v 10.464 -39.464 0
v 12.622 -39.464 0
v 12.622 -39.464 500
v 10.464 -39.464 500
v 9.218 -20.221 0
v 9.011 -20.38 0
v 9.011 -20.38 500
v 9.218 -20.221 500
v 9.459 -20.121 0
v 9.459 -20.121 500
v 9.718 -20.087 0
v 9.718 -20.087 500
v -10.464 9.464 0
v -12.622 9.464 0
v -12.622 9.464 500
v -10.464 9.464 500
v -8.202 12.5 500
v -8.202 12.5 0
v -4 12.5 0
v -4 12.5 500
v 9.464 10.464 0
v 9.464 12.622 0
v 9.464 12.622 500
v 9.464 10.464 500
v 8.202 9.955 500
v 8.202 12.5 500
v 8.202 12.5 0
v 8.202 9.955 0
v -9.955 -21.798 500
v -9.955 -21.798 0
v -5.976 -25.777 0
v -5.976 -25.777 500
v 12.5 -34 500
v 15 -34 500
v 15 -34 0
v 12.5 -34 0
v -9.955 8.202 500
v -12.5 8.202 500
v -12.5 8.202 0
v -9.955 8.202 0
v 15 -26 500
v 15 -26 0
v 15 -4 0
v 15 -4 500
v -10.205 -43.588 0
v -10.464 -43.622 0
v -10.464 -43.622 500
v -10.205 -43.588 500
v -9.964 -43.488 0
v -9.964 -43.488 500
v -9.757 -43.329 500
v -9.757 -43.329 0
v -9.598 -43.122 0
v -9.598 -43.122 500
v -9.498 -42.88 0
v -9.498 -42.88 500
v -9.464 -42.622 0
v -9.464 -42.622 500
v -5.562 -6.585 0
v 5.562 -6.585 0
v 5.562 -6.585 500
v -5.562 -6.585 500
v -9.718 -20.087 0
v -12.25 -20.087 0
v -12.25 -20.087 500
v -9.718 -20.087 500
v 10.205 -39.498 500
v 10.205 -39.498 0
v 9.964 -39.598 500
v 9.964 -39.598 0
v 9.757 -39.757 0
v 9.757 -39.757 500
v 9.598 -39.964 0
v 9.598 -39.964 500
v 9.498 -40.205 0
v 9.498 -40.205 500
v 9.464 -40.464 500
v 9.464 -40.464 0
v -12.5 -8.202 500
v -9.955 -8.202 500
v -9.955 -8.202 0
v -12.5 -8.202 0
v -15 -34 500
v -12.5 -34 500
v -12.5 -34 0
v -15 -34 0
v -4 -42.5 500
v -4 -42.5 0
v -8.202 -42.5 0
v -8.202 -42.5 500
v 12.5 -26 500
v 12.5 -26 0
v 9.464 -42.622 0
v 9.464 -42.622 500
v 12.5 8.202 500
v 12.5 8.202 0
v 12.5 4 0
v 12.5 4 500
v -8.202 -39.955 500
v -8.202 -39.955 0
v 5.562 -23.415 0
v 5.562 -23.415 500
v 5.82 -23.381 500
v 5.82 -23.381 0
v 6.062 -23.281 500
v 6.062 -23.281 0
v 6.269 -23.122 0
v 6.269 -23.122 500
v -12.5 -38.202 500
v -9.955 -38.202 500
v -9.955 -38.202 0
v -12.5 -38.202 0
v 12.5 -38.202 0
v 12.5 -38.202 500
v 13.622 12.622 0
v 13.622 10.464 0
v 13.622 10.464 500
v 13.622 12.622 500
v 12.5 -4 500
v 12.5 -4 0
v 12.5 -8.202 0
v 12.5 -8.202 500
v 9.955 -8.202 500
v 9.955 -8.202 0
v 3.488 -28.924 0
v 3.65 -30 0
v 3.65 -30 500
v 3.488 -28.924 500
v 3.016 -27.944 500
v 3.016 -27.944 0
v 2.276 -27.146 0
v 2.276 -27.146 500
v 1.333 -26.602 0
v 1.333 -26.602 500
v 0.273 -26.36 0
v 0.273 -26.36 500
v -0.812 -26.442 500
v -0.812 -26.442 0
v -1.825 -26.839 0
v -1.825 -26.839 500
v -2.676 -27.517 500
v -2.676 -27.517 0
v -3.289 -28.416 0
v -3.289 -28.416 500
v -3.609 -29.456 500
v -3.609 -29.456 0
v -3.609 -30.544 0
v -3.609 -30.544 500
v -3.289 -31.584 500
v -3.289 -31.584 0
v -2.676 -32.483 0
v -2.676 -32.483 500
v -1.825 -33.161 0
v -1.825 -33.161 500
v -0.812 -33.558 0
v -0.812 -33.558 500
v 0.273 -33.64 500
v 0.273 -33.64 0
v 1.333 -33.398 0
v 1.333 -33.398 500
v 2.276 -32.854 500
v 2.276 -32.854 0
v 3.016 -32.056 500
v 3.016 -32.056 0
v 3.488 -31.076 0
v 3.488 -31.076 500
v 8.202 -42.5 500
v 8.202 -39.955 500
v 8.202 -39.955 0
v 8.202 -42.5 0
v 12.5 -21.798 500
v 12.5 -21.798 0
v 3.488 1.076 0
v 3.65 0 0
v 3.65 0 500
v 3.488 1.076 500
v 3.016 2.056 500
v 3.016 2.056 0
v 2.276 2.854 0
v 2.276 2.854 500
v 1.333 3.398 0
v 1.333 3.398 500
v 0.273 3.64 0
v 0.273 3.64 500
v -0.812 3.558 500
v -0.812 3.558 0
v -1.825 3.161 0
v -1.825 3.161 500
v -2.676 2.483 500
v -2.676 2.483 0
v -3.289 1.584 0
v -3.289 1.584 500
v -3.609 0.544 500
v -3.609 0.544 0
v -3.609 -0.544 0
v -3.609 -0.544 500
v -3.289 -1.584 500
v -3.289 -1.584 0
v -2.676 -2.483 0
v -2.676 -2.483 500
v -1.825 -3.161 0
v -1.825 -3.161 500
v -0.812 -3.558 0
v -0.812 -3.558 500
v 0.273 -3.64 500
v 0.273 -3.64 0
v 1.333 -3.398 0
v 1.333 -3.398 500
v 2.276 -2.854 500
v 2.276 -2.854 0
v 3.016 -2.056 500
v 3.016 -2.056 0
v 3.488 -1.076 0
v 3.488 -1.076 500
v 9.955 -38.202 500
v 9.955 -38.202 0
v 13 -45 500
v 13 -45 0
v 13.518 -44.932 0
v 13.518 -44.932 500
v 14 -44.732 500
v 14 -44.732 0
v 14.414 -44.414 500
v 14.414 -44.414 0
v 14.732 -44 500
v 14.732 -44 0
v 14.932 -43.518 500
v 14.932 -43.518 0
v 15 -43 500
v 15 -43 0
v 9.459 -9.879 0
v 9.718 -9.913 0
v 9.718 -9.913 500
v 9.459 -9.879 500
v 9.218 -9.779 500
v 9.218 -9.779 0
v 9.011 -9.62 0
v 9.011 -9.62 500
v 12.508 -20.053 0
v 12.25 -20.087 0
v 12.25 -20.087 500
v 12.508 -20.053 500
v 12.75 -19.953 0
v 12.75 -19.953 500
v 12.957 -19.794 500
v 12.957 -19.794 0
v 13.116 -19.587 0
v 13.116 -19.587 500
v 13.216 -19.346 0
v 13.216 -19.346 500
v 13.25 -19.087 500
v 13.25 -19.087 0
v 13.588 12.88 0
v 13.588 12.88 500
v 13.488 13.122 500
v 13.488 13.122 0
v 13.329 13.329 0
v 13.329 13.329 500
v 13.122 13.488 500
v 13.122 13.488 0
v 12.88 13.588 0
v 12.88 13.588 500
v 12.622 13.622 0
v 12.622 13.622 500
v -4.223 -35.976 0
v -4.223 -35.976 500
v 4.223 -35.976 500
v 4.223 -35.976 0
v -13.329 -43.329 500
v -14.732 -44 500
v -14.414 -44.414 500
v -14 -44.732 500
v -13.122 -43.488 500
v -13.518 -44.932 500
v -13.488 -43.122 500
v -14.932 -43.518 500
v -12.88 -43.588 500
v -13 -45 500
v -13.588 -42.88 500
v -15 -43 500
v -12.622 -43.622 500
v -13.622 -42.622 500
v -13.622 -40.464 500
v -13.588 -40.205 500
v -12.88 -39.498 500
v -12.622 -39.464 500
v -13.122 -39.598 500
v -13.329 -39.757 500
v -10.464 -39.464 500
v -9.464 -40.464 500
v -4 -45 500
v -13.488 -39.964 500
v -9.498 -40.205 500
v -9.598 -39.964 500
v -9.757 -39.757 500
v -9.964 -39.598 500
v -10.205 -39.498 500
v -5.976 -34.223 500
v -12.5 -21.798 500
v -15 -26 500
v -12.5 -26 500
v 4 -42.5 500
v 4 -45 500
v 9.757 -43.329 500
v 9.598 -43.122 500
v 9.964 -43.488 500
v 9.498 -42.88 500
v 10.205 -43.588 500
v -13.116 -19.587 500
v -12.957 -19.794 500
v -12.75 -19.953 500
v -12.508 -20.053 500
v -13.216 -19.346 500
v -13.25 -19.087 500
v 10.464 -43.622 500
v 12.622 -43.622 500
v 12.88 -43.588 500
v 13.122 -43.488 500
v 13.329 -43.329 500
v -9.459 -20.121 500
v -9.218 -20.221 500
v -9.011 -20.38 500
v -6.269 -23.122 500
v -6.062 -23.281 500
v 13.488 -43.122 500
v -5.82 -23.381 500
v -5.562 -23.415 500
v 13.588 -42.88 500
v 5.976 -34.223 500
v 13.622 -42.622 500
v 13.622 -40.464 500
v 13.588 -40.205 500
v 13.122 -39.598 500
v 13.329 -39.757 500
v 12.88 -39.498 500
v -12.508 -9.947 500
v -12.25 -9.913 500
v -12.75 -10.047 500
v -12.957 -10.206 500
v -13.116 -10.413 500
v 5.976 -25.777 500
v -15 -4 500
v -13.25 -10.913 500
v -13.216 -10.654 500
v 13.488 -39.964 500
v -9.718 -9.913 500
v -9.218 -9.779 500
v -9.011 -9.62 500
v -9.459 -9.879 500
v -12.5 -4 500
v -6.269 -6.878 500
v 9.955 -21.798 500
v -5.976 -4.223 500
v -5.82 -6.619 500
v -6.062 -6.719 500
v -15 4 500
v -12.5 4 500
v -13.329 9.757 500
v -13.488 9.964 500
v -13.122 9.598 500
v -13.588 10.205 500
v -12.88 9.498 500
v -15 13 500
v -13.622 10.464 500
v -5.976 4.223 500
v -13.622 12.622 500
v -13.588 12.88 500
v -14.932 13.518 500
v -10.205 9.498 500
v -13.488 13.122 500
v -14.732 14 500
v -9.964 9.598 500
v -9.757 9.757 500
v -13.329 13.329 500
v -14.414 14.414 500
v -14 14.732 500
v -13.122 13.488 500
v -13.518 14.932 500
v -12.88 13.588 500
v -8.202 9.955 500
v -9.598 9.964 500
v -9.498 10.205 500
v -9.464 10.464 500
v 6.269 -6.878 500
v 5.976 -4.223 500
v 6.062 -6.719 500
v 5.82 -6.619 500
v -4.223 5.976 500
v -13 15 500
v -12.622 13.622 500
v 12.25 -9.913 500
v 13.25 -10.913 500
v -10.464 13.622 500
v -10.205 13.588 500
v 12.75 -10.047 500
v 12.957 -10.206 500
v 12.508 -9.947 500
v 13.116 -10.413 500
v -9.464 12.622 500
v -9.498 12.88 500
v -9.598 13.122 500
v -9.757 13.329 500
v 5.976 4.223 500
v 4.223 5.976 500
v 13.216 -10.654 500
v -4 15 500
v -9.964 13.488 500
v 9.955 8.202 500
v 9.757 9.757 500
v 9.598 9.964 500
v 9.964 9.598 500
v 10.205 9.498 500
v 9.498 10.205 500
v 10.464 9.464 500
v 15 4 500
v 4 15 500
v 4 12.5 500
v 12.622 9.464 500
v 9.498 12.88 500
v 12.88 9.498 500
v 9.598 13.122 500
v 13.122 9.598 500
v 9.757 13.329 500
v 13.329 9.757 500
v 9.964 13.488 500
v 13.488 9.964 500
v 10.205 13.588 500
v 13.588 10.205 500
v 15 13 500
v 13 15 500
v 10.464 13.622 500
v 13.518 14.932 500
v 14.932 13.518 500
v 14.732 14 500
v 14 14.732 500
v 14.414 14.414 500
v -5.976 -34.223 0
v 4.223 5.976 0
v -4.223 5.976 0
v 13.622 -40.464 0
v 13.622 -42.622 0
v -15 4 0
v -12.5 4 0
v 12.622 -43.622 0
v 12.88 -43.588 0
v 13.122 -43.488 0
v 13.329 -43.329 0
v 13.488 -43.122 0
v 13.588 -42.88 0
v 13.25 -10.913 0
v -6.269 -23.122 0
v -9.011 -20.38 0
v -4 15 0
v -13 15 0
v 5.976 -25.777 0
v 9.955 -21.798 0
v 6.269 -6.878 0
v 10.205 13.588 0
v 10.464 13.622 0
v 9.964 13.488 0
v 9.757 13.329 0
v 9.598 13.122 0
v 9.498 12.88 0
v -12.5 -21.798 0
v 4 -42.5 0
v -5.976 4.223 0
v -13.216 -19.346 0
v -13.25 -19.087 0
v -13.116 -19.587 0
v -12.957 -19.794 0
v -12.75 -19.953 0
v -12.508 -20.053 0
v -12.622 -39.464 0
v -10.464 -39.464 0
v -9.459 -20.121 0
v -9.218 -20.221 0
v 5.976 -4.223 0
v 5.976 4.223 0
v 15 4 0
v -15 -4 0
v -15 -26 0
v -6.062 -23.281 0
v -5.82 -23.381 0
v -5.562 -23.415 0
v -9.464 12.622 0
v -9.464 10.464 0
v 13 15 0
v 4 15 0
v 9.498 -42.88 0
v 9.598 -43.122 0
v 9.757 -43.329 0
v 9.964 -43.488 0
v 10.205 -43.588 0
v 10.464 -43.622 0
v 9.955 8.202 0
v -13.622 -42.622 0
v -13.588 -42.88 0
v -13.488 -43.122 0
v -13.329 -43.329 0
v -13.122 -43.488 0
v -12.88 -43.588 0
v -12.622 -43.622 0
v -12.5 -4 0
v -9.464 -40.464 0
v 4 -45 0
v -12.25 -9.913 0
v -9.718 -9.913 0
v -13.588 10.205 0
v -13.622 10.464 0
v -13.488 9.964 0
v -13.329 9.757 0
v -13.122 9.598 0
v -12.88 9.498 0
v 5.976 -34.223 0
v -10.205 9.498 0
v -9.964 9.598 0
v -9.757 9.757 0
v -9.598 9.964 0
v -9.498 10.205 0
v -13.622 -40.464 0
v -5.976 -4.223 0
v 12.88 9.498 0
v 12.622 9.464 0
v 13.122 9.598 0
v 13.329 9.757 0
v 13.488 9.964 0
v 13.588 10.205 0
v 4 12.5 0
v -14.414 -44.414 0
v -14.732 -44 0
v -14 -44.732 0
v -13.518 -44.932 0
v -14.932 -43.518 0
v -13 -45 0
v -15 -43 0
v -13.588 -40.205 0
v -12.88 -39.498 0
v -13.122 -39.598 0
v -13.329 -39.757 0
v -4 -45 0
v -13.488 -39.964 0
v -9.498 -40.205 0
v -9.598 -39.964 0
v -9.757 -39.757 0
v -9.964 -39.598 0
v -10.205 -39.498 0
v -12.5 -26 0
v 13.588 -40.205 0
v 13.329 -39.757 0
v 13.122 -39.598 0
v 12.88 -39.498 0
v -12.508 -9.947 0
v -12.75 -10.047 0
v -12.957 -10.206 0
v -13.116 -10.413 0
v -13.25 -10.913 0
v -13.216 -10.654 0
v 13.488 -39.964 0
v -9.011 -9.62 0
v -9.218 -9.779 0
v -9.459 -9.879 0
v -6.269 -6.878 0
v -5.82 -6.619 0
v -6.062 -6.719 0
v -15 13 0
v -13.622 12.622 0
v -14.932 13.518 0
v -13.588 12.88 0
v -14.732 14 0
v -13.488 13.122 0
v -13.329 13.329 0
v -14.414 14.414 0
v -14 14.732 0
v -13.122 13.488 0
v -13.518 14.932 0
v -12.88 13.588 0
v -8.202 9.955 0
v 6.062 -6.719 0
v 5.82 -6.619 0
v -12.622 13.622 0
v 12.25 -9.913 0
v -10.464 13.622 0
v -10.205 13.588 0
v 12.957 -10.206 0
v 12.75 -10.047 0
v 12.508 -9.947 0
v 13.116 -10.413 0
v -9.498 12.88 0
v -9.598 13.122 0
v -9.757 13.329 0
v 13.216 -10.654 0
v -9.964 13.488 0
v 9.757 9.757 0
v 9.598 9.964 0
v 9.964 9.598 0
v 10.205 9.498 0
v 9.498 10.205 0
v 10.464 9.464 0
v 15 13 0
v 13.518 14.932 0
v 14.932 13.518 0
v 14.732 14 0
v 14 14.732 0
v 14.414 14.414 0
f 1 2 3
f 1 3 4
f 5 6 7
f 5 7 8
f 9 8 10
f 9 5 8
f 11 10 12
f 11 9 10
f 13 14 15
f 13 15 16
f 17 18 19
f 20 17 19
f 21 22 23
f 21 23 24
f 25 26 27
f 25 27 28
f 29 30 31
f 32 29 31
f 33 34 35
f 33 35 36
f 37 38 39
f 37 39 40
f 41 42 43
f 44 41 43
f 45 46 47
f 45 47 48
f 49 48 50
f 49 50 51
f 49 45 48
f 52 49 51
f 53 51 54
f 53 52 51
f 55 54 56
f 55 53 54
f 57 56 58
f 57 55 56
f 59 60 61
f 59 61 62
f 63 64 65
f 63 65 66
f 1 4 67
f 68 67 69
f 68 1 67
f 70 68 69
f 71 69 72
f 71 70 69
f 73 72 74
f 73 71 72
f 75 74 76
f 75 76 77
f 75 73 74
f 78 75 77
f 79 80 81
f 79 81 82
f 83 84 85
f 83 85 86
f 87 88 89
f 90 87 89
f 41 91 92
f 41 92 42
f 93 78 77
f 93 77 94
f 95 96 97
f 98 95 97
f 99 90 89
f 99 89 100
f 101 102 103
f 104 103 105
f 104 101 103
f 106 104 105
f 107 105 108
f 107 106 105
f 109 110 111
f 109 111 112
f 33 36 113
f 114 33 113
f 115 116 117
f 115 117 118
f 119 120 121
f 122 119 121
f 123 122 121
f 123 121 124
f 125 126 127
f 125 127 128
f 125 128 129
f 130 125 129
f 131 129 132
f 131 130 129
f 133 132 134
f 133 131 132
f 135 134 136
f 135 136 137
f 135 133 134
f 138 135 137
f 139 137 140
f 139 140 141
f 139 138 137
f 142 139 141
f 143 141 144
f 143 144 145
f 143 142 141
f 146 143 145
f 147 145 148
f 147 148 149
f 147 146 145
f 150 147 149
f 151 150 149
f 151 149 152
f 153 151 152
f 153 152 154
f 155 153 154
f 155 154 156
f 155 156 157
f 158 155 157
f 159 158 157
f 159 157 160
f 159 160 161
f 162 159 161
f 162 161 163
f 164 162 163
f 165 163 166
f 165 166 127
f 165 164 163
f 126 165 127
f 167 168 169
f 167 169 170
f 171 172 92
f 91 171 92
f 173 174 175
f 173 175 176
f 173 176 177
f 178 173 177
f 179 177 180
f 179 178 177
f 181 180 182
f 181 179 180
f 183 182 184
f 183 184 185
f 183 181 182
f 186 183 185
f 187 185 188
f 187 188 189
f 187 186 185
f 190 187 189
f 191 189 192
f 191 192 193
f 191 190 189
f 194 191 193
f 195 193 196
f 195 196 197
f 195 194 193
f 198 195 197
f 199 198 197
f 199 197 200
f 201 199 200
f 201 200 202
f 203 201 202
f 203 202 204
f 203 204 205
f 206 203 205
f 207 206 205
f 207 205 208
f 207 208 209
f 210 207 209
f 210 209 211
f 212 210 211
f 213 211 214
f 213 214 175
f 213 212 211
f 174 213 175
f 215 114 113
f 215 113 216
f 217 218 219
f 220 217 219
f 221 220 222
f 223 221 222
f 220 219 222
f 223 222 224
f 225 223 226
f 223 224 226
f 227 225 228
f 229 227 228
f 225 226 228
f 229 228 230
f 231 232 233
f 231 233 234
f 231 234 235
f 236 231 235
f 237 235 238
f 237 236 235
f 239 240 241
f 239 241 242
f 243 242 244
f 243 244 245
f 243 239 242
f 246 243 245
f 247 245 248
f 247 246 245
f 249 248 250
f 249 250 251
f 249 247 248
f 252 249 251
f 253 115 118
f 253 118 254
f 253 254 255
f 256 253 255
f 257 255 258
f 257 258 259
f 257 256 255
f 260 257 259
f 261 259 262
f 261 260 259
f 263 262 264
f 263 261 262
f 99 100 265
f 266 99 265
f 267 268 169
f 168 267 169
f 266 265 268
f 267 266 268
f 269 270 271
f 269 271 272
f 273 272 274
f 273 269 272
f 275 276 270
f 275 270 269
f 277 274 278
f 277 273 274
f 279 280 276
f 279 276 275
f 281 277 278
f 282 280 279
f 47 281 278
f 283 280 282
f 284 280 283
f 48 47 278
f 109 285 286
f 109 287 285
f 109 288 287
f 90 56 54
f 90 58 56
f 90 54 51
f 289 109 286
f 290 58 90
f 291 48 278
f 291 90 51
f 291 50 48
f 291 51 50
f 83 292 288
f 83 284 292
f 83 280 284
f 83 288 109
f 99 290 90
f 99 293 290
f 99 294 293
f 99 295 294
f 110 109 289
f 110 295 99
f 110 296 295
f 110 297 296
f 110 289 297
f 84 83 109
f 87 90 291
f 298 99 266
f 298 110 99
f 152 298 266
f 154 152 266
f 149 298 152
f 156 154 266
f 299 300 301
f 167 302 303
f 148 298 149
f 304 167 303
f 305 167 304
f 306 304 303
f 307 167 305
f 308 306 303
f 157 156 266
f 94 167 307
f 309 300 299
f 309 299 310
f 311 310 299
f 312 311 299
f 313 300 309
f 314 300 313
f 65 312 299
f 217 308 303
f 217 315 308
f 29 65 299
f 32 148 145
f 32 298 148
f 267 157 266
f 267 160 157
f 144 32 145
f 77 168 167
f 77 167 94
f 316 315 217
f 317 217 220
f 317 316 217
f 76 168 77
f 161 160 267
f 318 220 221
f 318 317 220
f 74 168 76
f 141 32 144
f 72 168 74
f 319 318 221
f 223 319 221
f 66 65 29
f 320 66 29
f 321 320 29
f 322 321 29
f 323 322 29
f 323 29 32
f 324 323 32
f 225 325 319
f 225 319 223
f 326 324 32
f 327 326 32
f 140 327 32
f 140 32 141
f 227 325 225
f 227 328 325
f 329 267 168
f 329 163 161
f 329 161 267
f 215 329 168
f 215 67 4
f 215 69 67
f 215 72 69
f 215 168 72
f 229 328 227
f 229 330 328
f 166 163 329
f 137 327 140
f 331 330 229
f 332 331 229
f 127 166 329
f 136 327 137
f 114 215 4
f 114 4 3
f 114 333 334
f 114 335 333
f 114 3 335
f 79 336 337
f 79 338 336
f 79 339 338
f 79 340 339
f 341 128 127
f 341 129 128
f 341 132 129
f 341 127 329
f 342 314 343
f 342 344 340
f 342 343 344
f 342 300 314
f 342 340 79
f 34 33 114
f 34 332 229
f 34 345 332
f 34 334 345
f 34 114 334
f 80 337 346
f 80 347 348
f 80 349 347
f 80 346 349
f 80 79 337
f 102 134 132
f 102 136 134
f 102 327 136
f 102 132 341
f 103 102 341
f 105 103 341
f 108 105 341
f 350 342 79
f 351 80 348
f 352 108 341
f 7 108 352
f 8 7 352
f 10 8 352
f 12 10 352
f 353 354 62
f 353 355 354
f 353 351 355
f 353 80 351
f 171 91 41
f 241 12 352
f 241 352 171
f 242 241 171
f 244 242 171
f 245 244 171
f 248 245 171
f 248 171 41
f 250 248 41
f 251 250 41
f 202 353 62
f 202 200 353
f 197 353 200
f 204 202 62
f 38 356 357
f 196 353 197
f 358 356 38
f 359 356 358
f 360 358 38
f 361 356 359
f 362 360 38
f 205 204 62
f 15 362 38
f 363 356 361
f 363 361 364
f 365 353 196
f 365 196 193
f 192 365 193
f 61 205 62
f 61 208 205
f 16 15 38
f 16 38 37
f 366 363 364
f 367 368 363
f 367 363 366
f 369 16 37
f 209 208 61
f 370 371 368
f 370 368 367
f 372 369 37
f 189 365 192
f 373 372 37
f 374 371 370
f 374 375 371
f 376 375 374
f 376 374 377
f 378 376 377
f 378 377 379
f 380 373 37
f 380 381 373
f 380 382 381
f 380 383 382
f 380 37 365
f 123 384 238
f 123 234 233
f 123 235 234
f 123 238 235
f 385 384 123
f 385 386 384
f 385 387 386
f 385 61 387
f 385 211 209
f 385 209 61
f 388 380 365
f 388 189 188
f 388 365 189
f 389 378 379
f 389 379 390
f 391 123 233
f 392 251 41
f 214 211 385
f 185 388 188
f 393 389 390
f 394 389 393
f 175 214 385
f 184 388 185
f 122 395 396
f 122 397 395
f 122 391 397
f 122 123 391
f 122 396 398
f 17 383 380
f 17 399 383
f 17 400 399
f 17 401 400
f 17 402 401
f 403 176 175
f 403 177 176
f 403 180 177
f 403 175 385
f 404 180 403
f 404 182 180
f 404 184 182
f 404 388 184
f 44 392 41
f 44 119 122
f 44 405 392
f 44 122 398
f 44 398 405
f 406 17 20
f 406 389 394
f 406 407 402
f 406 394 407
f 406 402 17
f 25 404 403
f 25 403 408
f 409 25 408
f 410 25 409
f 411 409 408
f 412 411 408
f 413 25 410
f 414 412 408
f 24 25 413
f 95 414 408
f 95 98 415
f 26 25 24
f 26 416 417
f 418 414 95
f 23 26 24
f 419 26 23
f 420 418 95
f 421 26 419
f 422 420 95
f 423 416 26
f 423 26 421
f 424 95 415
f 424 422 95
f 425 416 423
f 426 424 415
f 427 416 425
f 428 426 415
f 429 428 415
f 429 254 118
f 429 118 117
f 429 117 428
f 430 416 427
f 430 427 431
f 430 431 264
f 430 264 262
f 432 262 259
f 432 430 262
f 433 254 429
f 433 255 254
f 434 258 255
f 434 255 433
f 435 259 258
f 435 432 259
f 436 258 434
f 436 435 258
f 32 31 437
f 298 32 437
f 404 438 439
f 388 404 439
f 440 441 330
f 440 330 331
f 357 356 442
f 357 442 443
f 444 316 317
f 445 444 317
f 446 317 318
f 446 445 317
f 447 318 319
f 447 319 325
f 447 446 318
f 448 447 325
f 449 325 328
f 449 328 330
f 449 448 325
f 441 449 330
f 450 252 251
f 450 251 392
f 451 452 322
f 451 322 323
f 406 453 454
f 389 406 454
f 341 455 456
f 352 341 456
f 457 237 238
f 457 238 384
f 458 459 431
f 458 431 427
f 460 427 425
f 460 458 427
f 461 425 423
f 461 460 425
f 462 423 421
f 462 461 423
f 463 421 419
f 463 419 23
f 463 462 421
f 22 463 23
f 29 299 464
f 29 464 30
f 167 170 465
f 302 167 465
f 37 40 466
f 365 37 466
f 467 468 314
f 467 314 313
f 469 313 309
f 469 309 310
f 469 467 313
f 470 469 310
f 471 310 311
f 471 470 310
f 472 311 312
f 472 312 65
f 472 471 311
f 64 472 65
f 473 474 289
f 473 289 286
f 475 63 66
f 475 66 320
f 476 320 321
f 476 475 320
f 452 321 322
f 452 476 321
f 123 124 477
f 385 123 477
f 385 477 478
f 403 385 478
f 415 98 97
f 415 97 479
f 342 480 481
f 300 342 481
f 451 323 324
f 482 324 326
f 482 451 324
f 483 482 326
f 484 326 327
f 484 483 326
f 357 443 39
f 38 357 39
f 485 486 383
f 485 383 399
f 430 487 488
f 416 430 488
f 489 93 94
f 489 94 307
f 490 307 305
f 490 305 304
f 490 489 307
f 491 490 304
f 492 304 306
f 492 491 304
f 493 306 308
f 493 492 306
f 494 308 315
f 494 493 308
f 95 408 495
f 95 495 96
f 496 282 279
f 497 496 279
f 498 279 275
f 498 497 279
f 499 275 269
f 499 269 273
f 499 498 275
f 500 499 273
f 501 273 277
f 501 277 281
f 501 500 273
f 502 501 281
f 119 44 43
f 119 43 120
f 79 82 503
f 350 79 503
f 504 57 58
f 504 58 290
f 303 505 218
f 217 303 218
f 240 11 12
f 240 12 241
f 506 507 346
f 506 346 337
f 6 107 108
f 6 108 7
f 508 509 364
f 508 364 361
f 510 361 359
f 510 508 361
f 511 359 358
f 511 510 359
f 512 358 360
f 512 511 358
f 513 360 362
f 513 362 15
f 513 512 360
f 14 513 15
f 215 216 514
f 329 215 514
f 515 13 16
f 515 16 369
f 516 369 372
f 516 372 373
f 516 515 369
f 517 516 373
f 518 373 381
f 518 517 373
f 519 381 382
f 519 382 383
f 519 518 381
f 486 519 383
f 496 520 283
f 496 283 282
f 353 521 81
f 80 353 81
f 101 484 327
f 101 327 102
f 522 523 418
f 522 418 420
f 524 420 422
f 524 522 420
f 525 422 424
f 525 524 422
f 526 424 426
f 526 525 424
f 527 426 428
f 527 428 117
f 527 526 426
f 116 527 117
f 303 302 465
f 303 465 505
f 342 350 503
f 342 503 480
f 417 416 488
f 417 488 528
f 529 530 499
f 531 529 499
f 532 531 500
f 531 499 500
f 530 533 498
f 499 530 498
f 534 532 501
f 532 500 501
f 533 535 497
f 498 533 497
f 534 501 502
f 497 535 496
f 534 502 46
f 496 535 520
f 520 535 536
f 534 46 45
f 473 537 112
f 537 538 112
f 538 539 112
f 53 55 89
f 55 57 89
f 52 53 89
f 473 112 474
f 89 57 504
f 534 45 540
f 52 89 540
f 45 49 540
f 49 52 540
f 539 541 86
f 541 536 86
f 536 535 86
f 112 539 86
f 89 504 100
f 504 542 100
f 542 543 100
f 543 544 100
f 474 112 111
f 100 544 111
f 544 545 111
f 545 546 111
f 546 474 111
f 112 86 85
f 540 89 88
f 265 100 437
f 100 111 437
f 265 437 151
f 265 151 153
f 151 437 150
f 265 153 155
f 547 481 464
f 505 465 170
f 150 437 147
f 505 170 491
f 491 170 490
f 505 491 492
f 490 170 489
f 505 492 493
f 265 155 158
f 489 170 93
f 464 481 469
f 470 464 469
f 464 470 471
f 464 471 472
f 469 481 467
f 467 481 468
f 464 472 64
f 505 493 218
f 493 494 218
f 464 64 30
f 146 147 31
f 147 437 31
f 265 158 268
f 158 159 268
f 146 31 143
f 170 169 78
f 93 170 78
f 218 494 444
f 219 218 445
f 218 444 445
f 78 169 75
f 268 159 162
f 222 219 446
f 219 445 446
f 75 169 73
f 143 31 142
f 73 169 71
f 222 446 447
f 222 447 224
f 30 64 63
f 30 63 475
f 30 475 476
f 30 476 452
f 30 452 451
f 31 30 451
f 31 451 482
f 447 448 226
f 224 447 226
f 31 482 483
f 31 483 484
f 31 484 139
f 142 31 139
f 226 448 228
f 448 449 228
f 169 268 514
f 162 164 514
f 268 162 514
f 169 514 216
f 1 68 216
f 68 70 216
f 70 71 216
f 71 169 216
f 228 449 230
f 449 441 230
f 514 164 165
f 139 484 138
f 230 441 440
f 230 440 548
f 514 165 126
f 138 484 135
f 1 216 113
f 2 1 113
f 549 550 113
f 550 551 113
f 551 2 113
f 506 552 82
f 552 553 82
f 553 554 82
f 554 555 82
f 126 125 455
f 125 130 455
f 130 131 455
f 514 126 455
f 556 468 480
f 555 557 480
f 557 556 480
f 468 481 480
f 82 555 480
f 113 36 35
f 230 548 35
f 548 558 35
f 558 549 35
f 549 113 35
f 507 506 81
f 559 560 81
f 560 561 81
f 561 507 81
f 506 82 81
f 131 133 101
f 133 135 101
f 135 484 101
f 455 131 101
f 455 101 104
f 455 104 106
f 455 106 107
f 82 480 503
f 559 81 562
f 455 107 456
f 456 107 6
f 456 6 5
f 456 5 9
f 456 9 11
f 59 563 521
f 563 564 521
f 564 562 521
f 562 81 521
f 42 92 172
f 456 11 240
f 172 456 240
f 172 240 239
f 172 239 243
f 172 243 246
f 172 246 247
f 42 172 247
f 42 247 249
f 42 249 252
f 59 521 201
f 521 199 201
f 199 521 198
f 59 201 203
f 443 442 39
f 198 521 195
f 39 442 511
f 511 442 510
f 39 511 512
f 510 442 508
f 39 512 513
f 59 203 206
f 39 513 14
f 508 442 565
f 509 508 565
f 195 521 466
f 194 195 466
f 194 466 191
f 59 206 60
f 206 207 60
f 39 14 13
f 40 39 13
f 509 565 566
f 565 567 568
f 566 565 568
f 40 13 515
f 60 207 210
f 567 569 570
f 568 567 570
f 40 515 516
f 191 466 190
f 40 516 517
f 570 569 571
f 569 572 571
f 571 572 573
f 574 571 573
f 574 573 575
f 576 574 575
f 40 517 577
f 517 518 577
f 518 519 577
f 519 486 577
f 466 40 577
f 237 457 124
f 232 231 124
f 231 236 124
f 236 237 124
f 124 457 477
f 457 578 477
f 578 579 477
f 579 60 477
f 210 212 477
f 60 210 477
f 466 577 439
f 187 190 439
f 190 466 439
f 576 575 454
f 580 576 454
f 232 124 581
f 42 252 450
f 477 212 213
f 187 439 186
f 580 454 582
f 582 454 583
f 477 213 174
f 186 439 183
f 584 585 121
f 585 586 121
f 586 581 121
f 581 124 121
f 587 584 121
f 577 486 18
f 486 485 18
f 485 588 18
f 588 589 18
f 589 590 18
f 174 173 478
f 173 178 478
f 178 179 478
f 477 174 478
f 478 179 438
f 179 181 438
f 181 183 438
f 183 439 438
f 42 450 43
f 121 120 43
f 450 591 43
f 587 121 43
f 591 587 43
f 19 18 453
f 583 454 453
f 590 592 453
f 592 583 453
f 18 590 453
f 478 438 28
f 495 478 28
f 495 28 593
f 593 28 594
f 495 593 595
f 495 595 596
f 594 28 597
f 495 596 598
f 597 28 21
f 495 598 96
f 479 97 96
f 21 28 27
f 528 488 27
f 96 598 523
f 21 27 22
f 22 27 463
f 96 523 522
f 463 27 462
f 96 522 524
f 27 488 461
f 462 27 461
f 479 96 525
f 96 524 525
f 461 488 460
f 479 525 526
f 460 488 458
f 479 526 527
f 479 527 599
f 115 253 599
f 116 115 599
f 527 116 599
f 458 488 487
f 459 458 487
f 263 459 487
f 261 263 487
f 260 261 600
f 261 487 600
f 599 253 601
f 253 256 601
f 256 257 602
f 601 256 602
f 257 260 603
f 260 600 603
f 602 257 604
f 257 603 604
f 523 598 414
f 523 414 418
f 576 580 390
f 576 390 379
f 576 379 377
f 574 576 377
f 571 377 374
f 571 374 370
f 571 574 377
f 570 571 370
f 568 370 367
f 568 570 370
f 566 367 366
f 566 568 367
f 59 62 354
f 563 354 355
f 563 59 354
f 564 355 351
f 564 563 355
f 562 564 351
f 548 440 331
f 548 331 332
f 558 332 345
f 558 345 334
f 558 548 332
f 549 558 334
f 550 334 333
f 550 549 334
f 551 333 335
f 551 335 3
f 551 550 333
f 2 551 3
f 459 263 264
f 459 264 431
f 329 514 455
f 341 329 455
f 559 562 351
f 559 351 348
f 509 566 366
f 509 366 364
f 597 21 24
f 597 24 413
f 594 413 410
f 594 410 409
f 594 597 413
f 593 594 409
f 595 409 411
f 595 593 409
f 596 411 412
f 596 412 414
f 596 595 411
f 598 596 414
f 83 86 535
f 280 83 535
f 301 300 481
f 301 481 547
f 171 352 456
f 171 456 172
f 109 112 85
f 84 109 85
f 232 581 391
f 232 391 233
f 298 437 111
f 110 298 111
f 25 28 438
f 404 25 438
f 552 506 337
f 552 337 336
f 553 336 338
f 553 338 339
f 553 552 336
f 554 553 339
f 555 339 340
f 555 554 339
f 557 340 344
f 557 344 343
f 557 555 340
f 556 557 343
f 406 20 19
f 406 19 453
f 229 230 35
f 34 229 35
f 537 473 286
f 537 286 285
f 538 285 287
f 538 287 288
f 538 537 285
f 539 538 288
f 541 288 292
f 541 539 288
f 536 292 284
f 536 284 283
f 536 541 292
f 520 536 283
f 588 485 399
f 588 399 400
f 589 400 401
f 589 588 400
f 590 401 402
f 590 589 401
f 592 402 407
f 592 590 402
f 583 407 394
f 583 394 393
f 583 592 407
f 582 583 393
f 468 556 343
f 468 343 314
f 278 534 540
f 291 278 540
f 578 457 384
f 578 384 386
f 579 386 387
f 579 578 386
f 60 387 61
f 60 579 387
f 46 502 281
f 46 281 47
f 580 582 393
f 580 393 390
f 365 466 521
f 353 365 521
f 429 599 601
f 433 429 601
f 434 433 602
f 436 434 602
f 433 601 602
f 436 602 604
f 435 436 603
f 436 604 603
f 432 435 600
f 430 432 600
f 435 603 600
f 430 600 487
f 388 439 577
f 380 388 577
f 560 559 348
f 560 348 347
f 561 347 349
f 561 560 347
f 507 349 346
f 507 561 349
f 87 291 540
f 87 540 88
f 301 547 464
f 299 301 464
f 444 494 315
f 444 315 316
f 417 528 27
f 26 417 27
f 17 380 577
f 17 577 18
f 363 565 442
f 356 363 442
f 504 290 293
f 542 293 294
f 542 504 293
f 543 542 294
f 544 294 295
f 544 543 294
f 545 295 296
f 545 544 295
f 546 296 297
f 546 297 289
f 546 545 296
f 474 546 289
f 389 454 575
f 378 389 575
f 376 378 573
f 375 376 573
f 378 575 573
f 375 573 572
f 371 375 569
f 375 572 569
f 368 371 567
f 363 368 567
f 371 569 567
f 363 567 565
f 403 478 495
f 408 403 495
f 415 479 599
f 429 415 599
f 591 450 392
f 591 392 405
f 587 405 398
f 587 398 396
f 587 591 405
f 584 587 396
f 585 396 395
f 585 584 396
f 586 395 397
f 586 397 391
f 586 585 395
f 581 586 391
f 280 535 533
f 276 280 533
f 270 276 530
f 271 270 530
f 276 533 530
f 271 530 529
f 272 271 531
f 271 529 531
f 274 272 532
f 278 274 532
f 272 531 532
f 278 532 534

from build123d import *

# Parameters (mm, degrees)
SKETCH1_R           = 3.65
BOSS_EXTRUDE1_DEPTH = 500


with BuildPart() as part:
    # Sketch1 → Boss-Extrude1 (new body)
    with BuildSketch(Plane.XY):
        with BuildLine():
            Line((-15, -34), (-15, -43))
            ThreePointArc((-15, -43), (-14.414213562, -44.414213562), (-13, -45))
            Line((-13, -45), (-4, -45))
            Line((-4, -45), (-4, -42.5))
            Line((-4, -42.5), (-8.202216073, -42.5))
            Line((-8.202216073, -42.5), (-8.202216073, -39.955429293))
            Line((-8.202216073, -39.955429293), (-4.222649634, -35.975862854))
            Line((-4.222649634, -35.975862854), (4.222649634, -35.975862854))
            Line((4.222649634, -35.975862854), (8.202216073, -39.955429293))
            Line((8.202216073, -39.955429293), (8.202216073, -42.5))
            Line((8.202216073, -42.5), (4, -42.5))
            Line((4, -42.5), (4, -45))
            Line((4, -45), (13, -45))
            ThreePointArc((13, -45), (14.414213562, -44.414213562), (15, -43))
            Line((15, -43), (15, -34))
            Line((15, -34), (12.5, -34))
            Line((12.5, -34), (12.5, -38.202216073))
            Line((12.5, -38.202216073), (9.955429293, -38.202216073))
            Line((9.955429293, -38.202216073), (5.975862854, -34.222649634))
            Line((5.975862854, -34.222649634), (5.975862854, -25.777350366))
            Line((5.975862854, -25.777350366), (9.955429293, -21.797783927))
            Line((9.955429293, -21.797783927), (12.5, -21.797783927))
            Line((12.5, -21.797783927), (12.5, -26))
            Line((12.5, -26), (15, -26))
            Line((15, -26), (15, -4))
            Line((15, -4), (12.5, -4))
            Line((12.5, -4), (12.5, -8.202216073))
            Line((12.5, -8.202216073), (9.955429293, -8.202216073))
            Line((9.955429293, -8.202216073), (5.975862854, -4.222649634))
            Line((5.975862854, -4.222649634), (5.975862854, 4.222649634))
            Line((5.975862854, 4.222649634), (9.955429293, 8.202216073))
            Line((9.955429293, 8.202216073), (12.5, 8.202216073))
            Line((12.5, 8.202216073), (12.5, 4))
            Line((12.5, 4), (15, 4))
            Line((15, 4), (15, 13))
            ThreePointArc((15, 13), (14.414213562, 14.414213562), (13, 15))
            Line((13, 15), (4, 15))
            Line((4, 15), (4, 12.5))
            Line((4, 12.5), (8.202216073, 12.5))
            Line((8.202216073, 12.5), (8.202216073, 9.955429293))
            Line((8.202216073, 9.955429293), (4.222649634, 5.975862854))
            Line((4.222649634, 5.975862854), (-4.222649634, 5.975862854))
            Line((-4.222649634, 5.975862854), (-8.202216073, 9.955429293))
            Line((-8.202216073, 9.955429293), (-8.202216073, 12.5))
            Line((-8.202216073, 12.5), (-4, 12.5))
            Line((-4, 12.5), (-4, 15))
            Line((-4, 15), (-13, 15))
            ThreePointArc((-13, 15), (-14.414213562, 14.414213562), (-15, 13))
            Line((-15, 13), (-15, 4))
            Line((-15, 4), (-12.5, 4))
            Line((-12.5, 4), (-12.5, 8.202216073))
            Line((-12.5, 8.202216073), (-9.955429293, 8.202216073))
            Line((-9.955429293, 8.202216073), (-5.975862854, 4.222649634))
            Line((-5.975862854, 4.222649634), (-5.975862854, -4.222649634))
            Line((-5.975862854, -4.222649634), (-9.955429293, -8.202216073))
            Line((-9.955429293, -8.202216073), (-12.5, -8.202216073))
            Line((-12.5, -8.202216073), (-12.5, -4))
            Line((-12.5, -4), (-15, -4))
            Line((-15, -4), (-15, -26))
            Line((-15, -26), (-12.5, -26))
            Line((-12.5, -26), (-12.5, -21.797783927))
            Line((-12.5, -21.797783927), (-9.955429293, -21.797783927))
            Line((-9.955429293, -21.797783927), (-5.975862854, -25.777350366))
            Line((-5.975862854, -25.777350366), (-5.975862854, -34.222649634))
            Line((-5.975862854, -34.222649634), (-9.955429293, -38.202216073))
            Line((-9.955429293, -38.202216073), (-12.5, -38.202216073))
            Line((-12.5, -38.202216073), (-12.5, -34))
            Line((-12.5, -34), (-15, -34))
        make_face()
        with Locations((0, -30)):
            Circle(SKETCH1_R, mode=Mode.SUBTRACT)
        Circle(SKETCH1_R, mode=Mode.SUBTRACT)
        with BuildLine():
            Line((-10.463955813, -39.463955813), (-12.621642737, -39.463955813))
            ThreePointArc((-12.621642737, -39.463955813), (-13.328749519, -39.756849032), (-13.621642737, -40.463955813))
            Line((-13.621642737, -40.463955813), (-13.621642737, -42.621642737))
            ThreePointArc((-13.621642737, -42.621642737), (-13.328749519, -43.328749519), (-12.621642737, -43.621642737))
            Line((-12.621642737, -43.621642737), (-10.463955813, -43.621642737))
            ThreePointArc((-10.463955813, -43.621642737), (-9.756849032, -43.328749519), (-9.463955813, -42.621642737))
            Line((-9.463955813, -42.621642737), (-9.463955813, -40.463955813))
            ThreePointArc((-9.463955813, -40.463955813), (-9.756849032, -39.756849032), (-10.463955813, -39.463955813))
        make_face(mode=Mode.SUBTRACT)
        with BuildLine():
            Line((9.011119828, -9.620135349), (6.268756073, -6.877771595))
            ThreePointArc((6.268756073, -6.877771595), (5.944332724, -6.660998843), (5.561649292, -6.584878376))
            Line((5.561649292, -6.584878376), (-5.561649292, -6.584878376))
            ThreePointArc((-5.561649292, -6.584878376), (-5.944332724, -6.660998843), (-6.268756073, -6.877771595))
            Line((-6.268756073, -6.877771595), (-9.011119828, -9.620135349))
            ThreePointArc((-9.011119828, -9.620135349), (-9.335543176, -9.836908101), (-9.718226609, -9.913028568))
            Line((-9.718226609, -9.913028568), (-12.249589991, -9.913028568))
            ThreePointArc((-12.249589991, -9.913028568), (-12.956696772, -10.205921787), (-13.249589991, -10.913028568))
            Line((-13.249589991, -10.913028568), (-13.249589991, -19.086971432))
            ThreePointArc((-13.249589991, -19.086971432), (-12.956696772, -19.794078213), (-12.249589991, -20.086971432))
            Line((-12.249589991, -20.086971432), (-9.718226609, -20.086971432))
            ThreePointArc((-9.718226609, -20.086971432), (-9.335543176, -20.163091899), (-9.011119828, -20.379864651))
            Line((-9.011119828, -20.379864651), (-6.268756073, -23.122228405))
            ThreePointArc((-6.268756073, -23.122228405), (-5.944332724, -23.339001157), (-5.561649292, -23.415121624))
            Line((-5.561649292, -23.415121624), (5.561649292, -23.415121624))
            ThreePointArc((5.561649292, -23.415121624), (5.944332724, -23.339001157), (6.268756073, -23.122228405))
            Line((6.268756073, -23.122228405), (9.011119828, -20.379864651))
            ThreePointArc((9.011119828, -20.379864651), (9.335543176, -20.163091899), (9.718226609, -20.086971432))
            Line((9.718226609, -20.086971432), (12.249589991, -20.086971432))
            ThreePointArc((12.249589991, -20.086971432), (12.956696772, -19.794078213), (13.249589991, -19.086971432))
            Line((13.249589991, -19.086971432), (13.249589991, -10.913028568))
            ThreePointArc((13.249589991, -10.913028568), (12.956696772, -10.205921787), (12.249589991, -9.913028568))
            Line((12.249589991, -9.913028568), (9.718226609, -9.913028568))
            ThreePointArc((9.718226609, -9.913028568), (9.335543176, -9.836908101), (9.011119828, -9.620135349))
        make_face(mode=Mode.SUBTRACT)
        with BuildLine():
            Line((9.463955813, -40.463955813), (9.463955813, -42.621642737))
            ThreePointArc((9.463955813, -42.621642737), (9.756849032, -43.328749519), (10.463955813, -43.621642737))
            Line((10.463955813, -43.621642737), (12.621642737, -43.621642737))
            ThreePointArc((12.621642737, -43.621642737), (13.328749519, -43.328749519), (13.621642737, -42.621642737))
            Line((13.621642737, -42.621642737), (13.621642737, -40.463955813))
            ThreePointArc((13.621642737, -40.463955813), (13.328749519, -39.756849032), (12.621642737, -39.463955813))
            Line((12.621642737, -39.463955813), (10.463955813, -39.463955813))
            ThreePointArc((10.463955813, -39.463955813), (9.756849032, -39.756849032), (9.463955813, -40.463955813))
        make_face(mode=Mode.SUBTRACT)
        with BuildLine():
            Line((-9.463955813, 10.463955813), (-9.463955813, 12.621642737))
            ThreePointArc((-9.463955813, 12.621642737), (-9.756849032, 13.328749519), (-10.463955813, 13.621642737))
            Line((-10.463955813, 13.621642737), (-12.621642737, 13.621642737))
            ThreePointArc((-12.621642737, 13.621642737), (-13.328749519, 13.328749519), (-13.621642737, 12.621642737))
            Line((-13.621642737, 12.621642737), (-13.621642737, 10.463955813))
            ThreePointArc((-13.621642737, 10.463955813), (-13.328749519, 9.756849032), (-12.621642737, 9.463955813))
            Line((-12.621642737, 9.463955813), (-10.463955813, 9.463955813))
            ThreePointArc((-10.463955813, 9.463955813), (-9.756849032, 9.756849032), (-9.463955813, 10.463955813))
        make_face(mode=Mode.SUBTRACT)
        with BuildLine():
            Line((10.463955813, 9.463955813), (12.621642737, 9.463955813))
            ThreePointArc((12.621642737, 9.463955813), (13.328749519, 9.756849032), (13.621642737, 10.463955813))
            Line((13.621642737, 10.463955813), (13.621642737, 12.621642737))
            ThreePointArc((13.621642737, 12.621642737), (13.328749519, 13.328749519), (12.621642737, 13.621642737))
            Line((12.621642737, 13.621642737), (10.463955813, 13.621642737))
            ThreePointArc((10.463955813, 13.621642737), (9.756849032, 13.328749519), (9.463955813, 12.621642737))
            Line((9.463955813, 12.621642737), (9.463955813, 10.463955813))
            ThreePointArc((9.463955813, 10.463955813), (9.756849032, 9.756849032), (10.463955813, 9.463955813))
        make_face(mode=Mode.SUBTRACT)
    extrude(amount=BOSS_EXTRUDE1_DEPTH)


solid = part.part
